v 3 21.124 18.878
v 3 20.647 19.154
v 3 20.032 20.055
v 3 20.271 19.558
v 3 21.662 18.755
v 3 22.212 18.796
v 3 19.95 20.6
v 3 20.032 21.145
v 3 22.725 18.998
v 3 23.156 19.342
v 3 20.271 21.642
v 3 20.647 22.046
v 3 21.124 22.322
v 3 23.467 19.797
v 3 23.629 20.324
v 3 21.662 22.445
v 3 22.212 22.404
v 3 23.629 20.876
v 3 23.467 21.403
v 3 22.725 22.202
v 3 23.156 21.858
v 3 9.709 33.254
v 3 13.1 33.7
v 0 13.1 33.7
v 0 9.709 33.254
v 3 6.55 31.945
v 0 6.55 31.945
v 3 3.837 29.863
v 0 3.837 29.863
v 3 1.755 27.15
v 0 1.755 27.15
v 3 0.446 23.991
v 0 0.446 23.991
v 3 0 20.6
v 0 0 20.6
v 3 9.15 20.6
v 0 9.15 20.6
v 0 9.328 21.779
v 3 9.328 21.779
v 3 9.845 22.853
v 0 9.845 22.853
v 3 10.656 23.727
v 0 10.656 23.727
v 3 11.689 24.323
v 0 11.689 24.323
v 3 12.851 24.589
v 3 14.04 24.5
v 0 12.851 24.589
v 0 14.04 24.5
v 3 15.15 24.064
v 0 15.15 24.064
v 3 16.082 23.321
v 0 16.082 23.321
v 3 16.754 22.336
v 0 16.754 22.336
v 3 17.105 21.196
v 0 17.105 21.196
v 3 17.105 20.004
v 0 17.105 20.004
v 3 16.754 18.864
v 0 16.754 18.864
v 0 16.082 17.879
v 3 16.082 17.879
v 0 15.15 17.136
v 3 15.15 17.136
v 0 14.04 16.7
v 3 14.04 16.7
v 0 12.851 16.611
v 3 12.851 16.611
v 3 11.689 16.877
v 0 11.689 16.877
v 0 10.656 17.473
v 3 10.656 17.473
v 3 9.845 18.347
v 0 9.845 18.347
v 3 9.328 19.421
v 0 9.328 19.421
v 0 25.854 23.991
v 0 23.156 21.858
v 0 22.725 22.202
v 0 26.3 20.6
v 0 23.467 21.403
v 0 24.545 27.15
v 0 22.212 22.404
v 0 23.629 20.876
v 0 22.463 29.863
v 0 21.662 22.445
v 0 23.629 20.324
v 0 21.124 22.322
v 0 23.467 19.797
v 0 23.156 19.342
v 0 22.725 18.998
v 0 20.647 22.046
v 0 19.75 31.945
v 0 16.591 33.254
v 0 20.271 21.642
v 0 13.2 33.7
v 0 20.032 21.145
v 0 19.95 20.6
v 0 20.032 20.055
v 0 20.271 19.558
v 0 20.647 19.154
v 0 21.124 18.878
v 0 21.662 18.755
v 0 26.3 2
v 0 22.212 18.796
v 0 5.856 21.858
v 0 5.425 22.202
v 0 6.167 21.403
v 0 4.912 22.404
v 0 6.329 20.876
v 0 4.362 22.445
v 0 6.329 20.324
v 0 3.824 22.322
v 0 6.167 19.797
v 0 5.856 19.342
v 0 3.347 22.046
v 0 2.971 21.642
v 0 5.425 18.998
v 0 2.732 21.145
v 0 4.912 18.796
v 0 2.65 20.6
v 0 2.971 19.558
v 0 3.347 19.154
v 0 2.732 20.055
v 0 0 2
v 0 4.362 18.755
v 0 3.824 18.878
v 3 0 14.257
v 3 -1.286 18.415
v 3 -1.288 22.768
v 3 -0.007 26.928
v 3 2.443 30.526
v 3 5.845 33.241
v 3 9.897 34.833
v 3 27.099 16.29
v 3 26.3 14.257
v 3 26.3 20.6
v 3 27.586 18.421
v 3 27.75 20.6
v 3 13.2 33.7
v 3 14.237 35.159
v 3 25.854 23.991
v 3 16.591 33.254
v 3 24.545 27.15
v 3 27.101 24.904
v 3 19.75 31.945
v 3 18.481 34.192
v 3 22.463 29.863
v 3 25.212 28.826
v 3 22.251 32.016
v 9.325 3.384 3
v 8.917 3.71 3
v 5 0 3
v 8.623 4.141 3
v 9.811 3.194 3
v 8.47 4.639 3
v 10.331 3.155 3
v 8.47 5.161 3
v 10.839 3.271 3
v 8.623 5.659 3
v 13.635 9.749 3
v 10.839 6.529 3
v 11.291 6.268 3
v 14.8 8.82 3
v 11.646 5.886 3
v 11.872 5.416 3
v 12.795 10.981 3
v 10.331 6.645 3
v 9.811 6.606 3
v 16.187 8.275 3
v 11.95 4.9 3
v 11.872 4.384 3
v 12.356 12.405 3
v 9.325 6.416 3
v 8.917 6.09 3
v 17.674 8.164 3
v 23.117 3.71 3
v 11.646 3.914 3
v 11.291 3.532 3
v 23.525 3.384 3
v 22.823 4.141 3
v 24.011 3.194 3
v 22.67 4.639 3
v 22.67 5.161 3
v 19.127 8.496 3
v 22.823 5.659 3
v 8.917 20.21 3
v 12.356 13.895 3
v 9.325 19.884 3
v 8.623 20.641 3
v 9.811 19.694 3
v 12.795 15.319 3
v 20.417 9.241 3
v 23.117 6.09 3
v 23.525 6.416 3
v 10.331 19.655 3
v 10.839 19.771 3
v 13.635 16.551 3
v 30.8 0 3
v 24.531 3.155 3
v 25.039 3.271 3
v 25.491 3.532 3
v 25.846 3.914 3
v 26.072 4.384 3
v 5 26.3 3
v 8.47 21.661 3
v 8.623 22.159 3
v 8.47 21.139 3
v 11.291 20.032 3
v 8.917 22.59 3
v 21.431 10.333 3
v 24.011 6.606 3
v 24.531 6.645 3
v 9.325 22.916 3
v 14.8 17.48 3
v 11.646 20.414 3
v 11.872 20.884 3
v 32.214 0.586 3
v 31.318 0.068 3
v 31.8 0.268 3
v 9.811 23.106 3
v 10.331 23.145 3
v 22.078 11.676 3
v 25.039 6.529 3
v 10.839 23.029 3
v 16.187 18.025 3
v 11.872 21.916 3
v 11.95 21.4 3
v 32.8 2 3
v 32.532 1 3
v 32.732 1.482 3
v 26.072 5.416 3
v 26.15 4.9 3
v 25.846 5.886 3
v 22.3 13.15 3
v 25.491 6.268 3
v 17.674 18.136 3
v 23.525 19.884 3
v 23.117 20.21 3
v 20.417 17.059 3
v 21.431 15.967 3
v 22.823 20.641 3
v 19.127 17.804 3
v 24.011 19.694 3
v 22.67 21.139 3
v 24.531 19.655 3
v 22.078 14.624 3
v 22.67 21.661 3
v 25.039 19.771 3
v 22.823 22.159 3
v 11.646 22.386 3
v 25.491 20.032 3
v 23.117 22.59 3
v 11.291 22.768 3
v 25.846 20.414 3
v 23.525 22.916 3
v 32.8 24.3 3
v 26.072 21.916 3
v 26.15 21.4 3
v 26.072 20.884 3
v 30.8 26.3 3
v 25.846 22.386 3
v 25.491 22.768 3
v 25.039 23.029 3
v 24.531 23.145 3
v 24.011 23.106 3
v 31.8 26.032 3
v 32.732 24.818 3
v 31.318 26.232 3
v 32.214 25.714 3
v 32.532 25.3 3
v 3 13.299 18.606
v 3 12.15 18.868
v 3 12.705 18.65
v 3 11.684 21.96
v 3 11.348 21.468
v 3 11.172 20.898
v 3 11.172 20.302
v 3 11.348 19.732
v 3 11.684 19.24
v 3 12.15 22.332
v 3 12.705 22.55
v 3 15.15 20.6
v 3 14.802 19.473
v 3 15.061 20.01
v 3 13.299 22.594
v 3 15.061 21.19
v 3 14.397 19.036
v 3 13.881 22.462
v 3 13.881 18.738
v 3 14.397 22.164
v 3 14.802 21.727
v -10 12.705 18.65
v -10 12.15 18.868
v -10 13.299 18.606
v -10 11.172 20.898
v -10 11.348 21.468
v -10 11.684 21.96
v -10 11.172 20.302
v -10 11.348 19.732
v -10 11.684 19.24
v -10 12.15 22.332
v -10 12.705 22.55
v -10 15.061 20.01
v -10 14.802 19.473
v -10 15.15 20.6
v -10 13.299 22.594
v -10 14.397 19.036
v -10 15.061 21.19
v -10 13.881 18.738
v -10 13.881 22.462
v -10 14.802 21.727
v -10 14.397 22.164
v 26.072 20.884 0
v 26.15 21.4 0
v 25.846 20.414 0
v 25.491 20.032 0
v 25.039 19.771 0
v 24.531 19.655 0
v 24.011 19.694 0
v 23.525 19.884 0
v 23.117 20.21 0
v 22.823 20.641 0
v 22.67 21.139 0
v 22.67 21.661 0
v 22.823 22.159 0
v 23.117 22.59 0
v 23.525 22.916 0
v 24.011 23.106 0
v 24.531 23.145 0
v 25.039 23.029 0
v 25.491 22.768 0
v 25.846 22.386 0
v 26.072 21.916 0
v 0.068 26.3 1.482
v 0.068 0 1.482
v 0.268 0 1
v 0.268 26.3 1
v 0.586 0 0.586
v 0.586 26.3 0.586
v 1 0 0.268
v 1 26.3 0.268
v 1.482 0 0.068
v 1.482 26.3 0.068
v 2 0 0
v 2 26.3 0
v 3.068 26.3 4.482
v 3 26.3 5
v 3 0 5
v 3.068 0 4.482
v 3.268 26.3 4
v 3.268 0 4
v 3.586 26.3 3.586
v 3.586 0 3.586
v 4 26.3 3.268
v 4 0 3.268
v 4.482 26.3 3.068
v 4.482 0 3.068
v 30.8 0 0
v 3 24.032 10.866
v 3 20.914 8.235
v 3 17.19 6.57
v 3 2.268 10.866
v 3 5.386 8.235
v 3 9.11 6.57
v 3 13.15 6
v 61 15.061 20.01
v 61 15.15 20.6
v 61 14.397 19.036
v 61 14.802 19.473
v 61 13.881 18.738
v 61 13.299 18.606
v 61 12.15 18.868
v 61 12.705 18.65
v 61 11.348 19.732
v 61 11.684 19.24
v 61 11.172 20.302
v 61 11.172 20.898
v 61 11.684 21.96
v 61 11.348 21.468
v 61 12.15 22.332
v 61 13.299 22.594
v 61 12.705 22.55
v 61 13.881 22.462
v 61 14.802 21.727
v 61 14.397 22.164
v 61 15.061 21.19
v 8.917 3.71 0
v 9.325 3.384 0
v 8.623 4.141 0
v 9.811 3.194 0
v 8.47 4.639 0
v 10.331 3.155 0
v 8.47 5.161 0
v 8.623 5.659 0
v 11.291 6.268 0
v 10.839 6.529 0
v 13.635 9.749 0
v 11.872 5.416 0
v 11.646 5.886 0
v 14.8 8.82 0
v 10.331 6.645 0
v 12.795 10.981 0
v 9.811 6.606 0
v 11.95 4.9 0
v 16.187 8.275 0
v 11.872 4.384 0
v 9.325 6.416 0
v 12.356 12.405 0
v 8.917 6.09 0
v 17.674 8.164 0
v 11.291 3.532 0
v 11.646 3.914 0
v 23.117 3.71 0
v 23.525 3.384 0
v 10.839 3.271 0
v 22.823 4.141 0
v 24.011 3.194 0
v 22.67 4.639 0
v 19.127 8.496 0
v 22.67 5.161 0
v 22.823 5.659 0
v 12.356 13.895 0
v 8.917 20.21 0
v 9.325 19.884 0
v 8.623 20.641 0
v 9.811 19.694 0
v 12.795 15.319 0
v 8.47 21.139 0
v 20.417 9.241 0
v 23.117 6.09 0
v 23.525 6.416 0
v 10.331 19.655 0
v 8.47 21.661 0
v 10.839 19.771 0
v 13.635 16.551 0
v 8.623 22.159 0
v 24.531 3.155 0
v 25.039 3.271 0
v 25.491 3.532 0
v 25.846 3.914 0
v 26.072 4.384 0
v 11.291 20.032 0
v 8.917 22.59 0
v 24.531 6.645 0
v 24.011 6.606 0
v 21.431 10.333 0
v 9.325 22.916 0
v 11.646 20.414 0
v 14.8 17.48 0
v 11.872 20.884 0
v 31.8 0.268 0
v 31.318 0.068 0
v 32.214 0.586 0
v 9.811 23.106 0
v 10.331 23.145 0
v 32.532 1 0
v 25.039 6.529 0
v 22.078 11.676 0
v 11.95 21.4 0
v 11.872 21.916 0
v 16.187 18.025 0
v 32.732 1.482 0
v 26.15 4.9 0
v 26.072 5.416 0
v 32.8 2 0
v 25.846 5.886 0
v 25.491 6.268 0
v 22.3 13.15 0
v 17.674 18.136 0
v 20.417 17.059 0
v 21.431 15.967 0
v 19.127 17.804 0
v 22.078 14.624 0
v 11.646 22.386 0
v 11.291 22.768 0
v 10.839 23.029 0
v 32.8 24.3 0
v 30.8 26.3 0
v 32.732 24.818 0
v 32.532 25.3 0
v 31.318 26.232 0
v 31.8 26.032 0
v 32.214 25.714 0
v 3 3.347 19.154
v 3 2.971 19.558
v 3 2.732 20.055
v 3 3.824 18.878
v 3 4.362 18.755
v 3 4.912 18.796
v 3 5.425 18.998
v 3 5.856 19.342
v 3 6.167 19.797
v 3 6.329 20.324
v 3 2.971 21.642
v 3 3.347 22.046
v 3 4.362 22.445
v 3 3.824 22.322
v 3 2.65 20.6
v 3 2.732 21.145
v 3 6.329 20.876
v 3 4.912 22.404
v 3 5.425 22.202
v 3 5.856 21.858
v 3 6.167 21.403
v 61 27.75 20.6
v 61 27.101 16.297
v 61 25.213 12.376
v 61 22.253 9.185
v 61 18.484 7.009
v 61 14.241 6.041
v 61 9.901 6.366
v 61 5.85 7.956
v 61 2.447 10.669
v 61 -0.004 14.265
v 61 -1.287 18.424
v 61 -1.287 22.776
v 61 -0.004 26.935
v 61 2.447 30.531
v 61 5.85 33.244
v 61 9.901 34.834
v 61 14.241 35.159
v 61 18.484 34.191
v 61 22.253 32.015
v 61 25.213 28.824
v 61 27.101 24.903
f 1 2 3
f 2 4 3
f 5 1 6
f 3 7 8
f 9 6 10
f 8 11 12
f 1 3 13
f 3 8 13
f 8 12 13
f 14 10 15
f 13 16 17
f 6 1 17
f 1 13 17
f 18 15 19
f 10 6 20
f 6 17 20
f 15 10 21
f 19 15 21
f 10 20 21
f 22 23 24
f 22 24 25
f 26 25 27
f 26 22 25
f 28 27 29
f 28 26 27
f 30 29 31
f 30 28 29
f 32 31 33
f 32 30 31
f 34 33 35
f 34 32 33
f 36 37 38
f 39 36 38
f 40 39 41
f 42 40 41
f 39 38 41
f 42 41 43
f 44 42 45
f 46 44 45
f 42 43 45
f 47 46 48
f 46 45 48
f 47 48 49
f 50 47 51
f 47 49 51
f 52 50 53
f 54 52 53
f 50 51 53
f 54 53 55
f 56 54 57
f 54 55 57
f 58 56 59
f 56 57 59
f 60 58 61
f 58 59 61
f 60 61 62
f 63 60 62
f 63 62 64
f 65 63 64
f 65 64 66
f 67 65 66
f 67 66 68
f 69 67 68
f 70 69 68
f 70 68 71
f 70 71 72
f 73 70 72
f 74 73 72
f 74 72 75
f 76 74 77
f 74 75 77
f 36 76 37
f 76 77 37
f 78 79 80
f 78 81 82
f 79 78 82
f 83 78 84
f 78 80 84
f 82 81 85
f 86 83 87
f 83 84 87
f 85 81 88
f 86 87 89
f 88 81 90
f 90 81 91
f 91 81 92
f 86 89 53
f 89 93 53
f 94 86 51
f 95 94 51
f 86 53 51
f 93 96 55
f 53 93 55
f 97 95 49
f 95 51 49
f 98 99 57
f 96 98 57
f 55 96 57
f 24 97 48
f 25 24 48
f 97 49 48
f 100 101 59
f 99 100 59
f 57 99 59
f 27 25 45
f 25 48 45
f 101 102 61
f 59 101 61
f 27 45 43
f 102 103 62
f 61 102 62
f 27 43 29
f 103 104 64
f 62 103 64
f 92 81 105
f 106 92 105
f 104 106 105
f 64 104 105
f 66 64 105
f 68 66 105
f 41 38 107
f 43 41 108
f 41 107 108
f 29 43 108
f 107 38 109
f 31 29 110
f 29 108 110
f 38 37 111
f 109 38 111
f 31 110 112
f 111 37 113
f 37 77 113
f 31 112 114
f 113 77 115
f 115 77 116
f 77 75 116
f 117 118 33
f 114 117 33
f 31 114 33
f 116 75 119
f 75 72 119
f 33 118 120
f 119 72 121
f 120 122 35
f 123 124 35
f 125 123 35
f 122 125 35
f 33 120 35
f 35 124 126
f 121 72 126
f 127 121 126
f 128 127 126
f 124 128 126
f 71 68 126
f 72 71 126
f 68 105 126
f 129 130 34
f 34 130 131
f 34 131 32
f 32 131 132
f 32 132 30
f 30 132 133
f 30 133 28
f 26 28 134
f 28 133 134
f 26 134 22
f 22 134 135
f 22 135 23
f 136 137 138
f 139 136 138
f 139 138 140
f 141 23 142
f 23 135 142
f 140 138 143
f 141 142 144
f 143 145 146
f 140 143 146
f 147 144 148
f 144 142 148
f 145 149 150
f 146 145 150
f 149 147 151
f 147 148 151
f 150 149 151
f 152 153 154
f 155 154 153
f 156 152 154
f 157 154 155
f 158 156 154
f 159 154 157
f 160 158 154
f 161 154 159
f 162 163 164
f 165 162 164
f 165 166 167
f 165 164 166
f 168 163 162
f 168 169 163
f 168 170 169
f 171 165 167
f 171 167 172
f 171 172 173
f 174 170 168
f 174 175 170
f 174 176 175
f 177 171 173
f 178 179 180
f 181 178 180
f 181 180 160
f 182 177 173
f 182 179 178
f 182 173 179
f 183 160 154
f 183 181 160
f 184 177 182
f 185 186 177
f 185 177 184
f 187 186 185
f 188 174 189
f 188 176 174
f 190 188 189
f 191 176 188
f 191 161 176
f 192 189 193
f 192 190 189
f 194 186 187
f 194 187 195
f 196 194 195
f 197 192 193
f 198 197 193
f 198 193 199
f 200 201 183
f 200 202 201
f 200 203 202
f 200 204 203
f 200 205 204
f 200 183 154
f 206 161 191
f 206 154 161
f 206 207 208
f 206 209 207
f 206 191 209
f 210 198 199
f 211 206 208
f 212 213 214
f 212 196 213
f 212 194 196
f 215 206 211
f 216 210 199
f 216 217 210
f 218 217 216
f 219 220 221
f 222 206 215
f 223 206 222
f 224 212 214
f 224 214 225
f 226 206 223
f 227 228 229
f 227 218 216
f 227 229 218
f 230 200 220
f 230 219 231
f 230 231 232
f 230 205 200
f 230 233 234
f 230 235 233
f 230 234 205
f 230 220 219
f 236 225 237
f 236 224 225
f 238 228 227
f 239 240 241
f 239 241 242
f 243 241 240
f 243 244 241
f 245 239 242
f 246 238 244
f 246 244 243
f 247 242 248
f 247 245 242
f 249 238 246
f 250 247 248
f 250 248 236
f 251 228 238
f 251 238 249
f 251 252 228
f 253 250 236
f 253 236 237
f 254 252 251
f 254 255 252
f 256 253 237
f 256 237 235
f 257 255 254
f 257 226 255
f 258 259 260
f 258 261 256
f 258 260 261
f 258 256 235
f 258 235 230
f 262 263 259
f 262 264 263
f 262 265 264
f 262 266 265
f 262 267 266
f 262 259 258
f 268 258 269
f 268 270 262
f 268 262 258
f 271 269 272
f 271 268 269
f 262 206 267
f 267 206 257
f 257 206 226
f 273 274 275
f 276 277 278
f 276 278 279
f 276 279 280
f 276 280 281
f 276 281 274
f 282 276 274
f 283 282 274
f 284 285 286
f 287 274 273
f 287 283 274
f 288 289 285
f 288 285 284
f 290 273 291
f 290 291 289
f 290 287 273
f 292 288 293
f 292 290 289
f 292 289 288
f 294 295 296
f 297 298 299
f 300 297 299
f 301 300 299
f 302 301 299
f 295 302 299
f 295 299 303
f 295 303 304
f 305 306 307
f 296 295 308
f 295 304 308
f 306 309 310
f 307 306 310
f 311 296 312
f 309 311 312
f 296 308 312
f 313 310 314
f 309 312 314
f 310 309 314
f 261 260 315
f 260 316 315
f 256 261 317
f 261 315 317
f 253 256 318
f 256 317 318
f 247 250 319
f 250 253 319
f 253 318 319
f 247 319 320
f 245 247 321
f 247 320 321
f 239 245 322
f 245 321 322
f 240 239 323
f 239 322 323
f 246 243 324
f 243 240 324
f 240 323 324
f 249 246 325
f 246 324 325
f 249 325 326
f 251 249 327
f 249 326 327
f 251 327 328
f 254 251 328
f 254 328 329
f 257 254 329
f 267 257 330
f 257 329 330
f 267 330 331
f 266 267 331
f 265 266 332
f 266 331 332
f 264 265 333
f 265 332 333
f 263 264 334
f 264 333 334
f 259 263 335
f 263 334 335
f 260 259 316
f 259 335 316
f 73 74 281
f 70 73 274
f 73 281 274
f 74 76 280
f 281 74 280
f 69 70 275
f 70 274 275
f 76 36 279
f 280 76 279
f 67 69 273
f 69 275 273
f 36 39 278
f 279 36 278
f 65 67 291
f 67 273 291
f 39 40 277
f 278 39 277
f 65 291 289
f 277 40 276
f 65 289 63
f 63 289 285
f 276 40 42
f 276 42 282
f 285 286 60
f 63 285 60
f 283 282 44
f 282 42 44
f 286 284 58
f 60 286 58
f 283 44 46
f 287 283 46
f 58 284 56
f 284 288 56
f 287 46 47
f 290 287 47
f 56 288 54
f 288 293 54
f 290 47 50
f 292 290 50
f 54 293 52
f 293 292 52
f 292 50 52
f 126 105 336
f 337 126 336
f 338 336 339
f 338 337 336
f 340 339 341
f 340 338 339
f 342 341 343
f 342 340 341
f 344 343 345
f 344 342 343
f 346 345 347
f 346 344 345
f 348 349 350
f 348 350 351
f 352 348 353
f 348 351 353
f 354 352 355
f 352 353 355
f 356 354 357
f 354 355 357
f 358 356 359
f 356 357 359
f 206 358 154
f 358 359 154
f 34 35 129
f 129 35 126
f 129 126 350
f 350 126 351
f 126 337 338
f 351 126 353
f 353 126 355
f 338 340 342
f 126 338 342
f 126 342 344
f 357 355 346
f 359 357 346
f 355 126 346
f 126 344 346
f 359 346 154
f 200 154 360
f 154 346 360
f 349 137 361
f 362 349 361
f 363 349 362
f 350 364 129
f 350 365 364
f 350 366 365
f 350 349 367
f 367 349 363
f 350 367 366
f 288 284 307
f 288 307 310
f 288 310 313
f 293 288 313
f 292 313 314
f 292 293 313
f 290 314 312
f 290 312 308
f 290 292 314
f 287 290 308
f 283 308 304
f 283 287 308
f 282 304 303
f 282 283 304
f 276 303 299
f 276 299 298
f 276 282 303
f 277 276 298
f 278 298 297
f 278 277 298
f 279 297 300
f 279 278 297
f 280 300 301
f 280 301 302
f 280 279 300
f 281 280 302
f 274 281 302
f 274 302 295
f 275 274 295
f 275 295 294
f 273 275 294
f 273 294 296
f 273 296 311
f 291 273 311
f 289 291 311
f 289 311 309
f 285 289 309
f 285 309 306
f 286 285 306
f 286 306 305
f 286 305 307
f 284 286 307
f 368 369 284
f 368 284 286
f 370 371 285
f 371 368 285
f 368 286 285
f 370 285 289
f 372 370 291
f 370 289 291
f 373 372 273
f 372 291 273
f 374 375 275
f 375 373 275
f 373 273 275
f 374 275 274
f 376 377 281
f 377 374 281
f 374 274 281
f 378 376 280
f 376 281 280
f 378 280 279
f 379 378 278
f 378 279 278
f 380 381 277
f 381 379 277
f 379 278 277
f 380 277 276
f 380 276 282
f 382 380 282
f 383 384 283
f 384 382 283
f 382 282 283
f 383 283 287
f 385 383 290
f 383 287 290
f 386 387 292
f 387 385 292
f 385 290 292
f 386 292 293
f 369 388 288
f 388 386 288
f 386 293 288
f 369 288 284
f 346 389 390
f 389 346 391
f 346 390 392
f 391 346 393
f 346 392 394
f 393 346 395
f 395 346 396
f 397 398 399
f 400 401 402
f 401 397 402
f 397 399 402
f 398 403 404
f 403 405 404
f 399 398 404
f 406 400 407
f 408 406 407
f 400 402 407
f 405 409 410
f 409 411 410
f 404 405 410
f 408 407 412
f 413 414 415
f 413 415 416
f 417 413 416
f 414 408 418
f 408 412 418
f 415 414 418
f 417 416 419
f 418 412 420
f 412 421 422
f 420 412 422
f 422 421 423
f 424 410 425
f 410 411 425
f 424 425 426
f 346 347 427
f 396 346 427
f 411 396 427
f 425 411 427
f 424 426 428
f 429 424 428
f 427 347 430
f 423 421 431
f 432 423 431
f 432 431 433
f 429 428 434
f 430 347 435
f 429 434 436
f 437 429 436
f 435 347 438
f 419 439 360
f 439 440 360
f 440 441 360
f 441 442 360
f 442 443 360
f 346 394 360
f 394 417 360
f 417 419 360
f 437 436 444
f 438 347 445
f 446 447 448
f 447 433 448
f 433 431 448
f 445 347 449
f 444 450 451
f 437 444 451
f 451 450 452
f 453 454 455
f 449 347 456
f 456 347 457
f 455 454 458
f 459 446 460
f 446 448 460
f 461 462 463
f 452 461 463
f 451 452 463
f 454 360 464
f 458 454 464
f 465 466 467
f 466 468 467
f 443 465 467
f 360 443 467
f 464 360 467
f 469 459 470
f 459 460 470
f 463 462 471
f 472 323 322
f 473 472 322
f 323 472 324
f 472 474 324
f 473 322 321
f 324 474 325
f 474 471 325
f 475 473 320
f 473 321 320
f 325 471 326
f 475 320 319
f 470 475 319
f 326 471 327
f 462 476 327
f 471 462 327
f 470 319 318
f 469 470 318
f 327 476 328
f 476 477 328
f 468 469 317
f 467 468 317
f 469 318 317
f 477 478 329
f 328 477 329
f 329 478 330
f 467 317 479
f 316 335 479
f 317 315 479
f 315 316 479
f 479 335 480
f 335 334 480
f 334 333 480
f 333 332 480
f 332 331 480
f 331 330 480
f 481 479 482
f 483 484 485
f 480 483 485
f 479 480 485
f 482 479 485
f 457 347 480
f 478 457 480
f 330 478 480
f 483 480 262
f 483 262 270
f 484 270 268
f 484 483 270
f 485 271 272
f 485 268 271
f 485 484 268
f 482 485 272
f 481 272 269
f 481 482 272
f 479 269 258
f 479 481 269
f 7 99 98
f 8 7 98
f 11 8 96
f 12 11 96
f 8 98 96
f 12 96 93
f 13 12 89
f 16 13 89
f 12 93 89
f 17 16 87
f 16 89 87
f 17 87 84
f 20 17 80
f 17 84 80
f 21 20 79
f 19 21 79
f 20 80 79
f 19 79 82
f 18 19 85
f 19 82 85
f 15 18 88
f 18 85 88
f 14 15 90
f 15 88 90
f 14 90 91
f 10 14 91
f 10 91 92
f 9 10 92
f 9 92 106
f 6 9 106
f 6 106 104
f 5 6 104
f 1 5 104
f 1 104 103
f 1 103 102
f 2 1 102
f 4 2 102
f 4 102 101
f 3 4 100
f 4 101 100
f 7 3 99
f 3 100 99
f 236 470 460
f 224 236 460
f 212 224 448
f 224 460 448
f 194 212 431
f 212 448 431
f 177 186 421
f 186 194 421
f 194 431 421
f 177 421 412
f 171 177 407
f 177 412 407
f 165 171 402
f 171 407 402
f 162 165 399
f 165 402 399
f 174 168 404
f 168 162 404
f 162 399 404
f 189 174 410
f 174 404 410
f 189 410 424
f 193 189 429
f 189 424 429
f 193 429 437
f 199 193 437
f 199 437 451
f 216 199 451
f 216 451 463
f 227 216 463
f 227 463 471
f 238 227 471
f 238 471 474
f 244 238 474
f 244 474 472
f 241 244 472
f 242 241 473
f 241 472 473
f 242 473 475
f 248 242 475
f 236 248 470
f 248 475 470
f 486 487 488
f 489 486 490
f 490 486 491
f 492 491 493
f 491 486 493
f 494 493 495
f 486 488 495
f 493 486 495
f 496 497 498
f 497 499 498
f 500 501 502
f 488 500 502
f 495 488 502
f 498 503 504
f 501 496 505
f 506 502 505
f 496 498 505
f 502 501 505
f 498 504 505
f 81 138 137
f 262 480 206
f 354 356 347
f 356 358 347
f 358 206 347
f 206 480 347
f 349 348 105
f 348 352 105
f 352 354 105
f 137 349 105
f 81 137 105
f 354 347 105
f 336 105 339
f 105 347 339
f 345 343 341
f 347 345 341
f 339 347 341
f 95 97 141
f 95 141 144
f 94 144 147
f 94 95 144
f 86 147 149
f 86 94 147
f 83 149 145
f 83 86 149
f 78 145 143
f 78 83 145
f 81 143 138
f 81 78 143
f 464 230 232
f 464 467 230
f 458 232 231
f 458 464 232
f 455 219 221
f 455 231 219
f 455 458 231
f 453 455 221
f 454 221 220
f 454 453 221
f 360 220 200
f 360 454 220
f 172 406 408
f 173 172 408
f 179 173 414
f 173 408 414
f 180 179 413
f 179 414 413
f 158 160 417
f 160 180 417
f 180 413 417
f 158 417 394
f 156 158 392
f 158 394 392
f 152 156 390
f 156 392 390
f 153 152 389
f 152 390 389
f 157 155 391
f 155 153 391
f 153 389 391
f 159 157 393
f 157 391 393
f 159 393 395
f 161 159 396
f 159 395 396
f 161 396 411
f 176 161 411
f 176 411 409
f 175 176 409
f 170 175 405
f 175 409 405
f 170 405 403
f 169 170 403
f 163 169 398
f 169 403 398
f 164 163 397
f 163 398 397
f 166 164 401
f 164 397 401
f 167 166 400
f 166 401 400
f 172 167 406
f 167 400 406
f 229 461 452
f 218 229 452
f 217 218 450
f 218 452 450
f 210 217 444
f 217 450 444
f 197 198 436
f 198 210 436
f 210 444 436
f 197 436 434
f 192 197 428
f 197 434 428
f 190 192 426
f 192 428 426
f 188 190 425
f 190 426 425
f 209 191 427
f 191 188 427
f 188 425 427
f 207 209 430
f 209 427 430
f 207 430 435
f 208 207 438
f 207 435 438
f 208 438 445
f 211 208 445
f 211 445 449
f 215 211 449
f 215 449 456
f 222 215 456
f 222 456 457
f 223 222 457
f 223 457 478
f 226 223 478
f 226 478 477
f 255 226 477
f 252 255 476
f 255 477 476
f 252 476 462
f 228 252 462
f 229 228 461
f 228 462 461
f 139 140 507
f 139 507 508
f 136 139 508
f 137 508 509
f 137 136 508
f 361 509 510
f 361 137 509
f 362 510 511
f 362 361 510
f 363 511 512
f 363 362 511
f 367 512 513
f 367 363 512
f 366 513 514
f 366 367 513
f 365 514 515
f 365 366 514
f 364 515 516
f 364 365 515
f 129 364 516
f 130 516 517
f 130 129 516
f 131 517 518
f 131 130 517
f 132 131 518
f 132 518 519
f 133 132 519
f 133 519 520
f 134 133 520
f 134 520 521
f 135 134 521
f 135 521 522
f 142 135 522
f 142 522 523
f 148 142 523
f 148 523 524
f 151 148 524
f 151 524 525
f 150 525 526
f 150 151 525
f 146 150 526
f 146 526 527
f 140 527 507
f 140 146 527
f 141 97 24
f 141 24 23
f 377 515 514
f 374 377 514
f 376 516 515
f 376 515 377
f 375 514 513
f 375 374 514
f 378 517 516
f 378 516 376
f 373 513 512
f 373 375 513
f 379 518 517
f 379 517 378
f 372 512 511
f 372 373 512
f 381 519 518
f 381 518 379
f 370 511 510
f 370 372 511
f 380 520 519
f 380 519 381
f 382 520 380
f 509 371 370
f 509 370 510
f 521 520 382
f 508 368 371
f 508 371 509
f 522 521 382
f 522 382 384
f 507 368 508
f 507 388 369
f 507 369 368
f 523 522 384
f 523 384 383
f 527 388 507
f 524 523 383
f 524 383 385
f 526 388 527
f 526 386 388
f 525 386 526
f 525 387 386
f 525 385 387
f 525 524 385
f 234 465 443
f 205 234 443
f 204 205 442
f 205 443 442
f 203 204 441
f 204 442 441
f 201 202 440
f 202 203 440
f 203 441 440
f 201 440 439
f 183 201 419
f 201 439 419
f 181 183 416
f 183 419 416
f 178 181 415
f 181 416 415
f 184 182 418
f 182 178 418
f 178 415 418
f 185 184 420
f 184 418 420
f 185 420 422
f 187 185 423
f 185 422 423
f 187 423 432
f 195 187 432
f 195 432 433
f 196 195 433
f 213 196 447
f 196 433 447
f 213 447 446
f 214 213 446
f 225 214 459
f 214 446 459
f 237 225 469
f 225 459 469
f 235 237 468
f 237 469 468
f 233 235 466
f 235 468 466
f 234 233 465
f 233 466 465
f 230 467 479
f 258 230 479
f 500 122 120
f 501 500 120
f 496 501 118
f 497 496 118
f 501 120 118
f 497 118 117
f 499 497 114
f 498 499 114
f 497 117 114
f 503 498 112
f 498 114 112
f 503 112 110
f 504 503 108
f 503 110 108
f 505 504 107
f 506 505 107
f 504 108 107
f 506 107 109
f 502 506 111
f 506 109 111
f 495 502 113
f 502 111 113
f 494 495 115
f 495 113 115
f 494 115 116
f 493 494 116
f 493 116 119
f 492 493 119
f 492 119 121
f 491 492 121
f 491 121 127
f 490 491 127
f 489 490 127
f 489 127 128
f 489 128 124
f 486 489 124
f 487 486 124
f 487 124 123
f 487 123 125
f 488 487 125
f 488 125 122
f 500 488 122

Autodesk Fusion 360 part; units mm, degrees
sketch "Sketch1" plane through (0, 0, 0) normal (0, 0, 1) x (1, 0, 0)
  line L0 (0, 0) -> (30.8, 0)
  line L1 (32.8, 2) -> (32.8, 24.3)
  line L2 (30.8, 26.3) -> (0, 26.3)
  line L3 (0, 26.3) -> (0, 0)
  line L4 (3, 26.3) -> (3, 0)
  circle A0 centre (10.2, 21.4) radius 1.75
  circle A1 centre (24.4, 21.4) radius 1.75
  circle A2 centre (10.2, 4.9) radius 1.75
  circle A3 centre (24.4, 4.9) radius 1.75
  circle A4 centre (17.3, 13.15) radius 5
  line L5 (10.2, 4.9) -> (10.2, 21.4) construction
  line L6 (10.2, 21.4) -> (24.4, 21.4) construction
  line L7 (24.4, 21.4) -> (24.4, 4.9) construction
  line L8 (24.4, 4.9) -> (10.2, 4.9) construction
  arc A5 (32.8, 24.3) -> (30.8, 26.3) centre (30.8, 24.3) ccw
  arc A6 (30.8, 0) -> (32.8, 2) centre (30.8, 2) ccw
  line L9 (3, 13.15) -> (32.8, 13.15) construction
  point P0 (32.8, 0)
  point P1 (10.2, 13.15)
  point P2 (17.3, 21.4)
  point P3 (24.4, 13.15)
  point P4 (17.3, 4.9)
  dimension "d1" = 32.8
  dimension "d2" = 26.3
  dimension "d3" = 3
  dimension "d4" = 3.5
  dimension "d7" = 14.2
  dimension "d8" = -16.5
  dimension "d9" = 10
  dimension "d10" = 15.5
  dimension "d11" = 2
extrude "Extrude1" add sketch "Sketch1" along normal blind 3 contours L0 L1 L2 L4 A5 A6 makes body 1
extrude "Extrude2" add sketch "Sketch1" along normal blind 33.7 contours L0 L2 L3 L4 bodies 1
fillet "Fillet1" radius 13.1 2 edges at (1.5, 0, 33.7) (1.5, 26.3, 33.7) on bodies 1
sketch "Sketch2" plane through (0, 0, 0) normal (-1, 0, 0) x (0, -1, 0)
  arc A0 (-13.2, 33.7) -> (-26.3, 20.6) centre (-13.2, 20.6) ccw
  line L0 (-26.3, 20.6) -> (-26.3, 0)
  line L1 (-26.3, 0) -> (0, 0)
  line L2 (0, 0) -> (0, 20.6)
  arc A1 (0, 20.6) -> (-13.1, 33.7) centre (-13.1, 20.6) ccw
  line L3 (-13.1, 33.7) -> (-13.2, 33.7)
  line L4 (-26.3, 20.6) -> (0, 20.6) construction
  circle A2 centre (-13.15, 20.6) radius 4
  circle A3 centre (-21.8, 20.6) radius 1.85
  line L5 (-13.15, 0) -> (-13.15, 33.7) construction
  circle A4 centre (-4.5, 20.6) radius 1.85
  point P0 (-13.15, 20.6)
  dimension "d18" = 8
  dimension "d19" = 3.7
  dimension "d20" = 8.65
extrude "Extrude3" cut sketch "Sketch2" against normal blind 6 contours A2 | A3 | A4 bodies 1
fillet "Fillet2" radius 2 2 edges at (3, 13.15, 3) (0, 13.15, 0) on bodies 1
sketch "Sketch3" plane through (3, 0, 0) normal (1, 0, 0) x (0, 1, 0)
  line L0 (0, 5) -> (26.3, 5)
  line L1 (26.3, 5) -> (26.3, 20.6)
  arc A0 (26.3, 20.6) -> (13.2, 33.7) centre (13.2, 20.6) ccw
  line L2 (13.2, 33.7) -> (13.1, 33.7)
  arc A1 (13.1, 33.7) -> (0, 20.6) centre (13.1, 20.6) ccw
  line L3 (0, 20.6) -> (0, 5)
  circle A2 centre (4.5, 20.6) radius 1.85
  circle A3 centre (13.15, 20.6) radius 4
  circle A4 centre (21.8, 20.6) radius 1.85
  circle A5 centre (13.15, 20.6) radius 14.6
  circle A6 centre (13.15, 20.6) radius 2
  dimension "d25" = 29.2
  dimension "d26" = 4
extrude "Extrude4" add sketch "Sketch3" along normal blind 58 contours L1 A0 L2 A1 L3 A5 | L1 A0 L2 A1 L3 A5 | A2 | A3 | A4 bodies 1
extrude "Extrude5" add sketch "Sketch3" against normal blind 13 separate body contours A6 makes body 2
equation "d7 = 17.7 mm - 3.5 mm"
equation "d8 = -( 20 mm - 3.5 mm )"
equation "d10 = 10.5 mm + 5 mm"
equation "d20 = 2.8 mm + ( ( 3.7 / 2 ) * 1 mm ) + ( ( 8 / 2 ) * 1 mm )"
